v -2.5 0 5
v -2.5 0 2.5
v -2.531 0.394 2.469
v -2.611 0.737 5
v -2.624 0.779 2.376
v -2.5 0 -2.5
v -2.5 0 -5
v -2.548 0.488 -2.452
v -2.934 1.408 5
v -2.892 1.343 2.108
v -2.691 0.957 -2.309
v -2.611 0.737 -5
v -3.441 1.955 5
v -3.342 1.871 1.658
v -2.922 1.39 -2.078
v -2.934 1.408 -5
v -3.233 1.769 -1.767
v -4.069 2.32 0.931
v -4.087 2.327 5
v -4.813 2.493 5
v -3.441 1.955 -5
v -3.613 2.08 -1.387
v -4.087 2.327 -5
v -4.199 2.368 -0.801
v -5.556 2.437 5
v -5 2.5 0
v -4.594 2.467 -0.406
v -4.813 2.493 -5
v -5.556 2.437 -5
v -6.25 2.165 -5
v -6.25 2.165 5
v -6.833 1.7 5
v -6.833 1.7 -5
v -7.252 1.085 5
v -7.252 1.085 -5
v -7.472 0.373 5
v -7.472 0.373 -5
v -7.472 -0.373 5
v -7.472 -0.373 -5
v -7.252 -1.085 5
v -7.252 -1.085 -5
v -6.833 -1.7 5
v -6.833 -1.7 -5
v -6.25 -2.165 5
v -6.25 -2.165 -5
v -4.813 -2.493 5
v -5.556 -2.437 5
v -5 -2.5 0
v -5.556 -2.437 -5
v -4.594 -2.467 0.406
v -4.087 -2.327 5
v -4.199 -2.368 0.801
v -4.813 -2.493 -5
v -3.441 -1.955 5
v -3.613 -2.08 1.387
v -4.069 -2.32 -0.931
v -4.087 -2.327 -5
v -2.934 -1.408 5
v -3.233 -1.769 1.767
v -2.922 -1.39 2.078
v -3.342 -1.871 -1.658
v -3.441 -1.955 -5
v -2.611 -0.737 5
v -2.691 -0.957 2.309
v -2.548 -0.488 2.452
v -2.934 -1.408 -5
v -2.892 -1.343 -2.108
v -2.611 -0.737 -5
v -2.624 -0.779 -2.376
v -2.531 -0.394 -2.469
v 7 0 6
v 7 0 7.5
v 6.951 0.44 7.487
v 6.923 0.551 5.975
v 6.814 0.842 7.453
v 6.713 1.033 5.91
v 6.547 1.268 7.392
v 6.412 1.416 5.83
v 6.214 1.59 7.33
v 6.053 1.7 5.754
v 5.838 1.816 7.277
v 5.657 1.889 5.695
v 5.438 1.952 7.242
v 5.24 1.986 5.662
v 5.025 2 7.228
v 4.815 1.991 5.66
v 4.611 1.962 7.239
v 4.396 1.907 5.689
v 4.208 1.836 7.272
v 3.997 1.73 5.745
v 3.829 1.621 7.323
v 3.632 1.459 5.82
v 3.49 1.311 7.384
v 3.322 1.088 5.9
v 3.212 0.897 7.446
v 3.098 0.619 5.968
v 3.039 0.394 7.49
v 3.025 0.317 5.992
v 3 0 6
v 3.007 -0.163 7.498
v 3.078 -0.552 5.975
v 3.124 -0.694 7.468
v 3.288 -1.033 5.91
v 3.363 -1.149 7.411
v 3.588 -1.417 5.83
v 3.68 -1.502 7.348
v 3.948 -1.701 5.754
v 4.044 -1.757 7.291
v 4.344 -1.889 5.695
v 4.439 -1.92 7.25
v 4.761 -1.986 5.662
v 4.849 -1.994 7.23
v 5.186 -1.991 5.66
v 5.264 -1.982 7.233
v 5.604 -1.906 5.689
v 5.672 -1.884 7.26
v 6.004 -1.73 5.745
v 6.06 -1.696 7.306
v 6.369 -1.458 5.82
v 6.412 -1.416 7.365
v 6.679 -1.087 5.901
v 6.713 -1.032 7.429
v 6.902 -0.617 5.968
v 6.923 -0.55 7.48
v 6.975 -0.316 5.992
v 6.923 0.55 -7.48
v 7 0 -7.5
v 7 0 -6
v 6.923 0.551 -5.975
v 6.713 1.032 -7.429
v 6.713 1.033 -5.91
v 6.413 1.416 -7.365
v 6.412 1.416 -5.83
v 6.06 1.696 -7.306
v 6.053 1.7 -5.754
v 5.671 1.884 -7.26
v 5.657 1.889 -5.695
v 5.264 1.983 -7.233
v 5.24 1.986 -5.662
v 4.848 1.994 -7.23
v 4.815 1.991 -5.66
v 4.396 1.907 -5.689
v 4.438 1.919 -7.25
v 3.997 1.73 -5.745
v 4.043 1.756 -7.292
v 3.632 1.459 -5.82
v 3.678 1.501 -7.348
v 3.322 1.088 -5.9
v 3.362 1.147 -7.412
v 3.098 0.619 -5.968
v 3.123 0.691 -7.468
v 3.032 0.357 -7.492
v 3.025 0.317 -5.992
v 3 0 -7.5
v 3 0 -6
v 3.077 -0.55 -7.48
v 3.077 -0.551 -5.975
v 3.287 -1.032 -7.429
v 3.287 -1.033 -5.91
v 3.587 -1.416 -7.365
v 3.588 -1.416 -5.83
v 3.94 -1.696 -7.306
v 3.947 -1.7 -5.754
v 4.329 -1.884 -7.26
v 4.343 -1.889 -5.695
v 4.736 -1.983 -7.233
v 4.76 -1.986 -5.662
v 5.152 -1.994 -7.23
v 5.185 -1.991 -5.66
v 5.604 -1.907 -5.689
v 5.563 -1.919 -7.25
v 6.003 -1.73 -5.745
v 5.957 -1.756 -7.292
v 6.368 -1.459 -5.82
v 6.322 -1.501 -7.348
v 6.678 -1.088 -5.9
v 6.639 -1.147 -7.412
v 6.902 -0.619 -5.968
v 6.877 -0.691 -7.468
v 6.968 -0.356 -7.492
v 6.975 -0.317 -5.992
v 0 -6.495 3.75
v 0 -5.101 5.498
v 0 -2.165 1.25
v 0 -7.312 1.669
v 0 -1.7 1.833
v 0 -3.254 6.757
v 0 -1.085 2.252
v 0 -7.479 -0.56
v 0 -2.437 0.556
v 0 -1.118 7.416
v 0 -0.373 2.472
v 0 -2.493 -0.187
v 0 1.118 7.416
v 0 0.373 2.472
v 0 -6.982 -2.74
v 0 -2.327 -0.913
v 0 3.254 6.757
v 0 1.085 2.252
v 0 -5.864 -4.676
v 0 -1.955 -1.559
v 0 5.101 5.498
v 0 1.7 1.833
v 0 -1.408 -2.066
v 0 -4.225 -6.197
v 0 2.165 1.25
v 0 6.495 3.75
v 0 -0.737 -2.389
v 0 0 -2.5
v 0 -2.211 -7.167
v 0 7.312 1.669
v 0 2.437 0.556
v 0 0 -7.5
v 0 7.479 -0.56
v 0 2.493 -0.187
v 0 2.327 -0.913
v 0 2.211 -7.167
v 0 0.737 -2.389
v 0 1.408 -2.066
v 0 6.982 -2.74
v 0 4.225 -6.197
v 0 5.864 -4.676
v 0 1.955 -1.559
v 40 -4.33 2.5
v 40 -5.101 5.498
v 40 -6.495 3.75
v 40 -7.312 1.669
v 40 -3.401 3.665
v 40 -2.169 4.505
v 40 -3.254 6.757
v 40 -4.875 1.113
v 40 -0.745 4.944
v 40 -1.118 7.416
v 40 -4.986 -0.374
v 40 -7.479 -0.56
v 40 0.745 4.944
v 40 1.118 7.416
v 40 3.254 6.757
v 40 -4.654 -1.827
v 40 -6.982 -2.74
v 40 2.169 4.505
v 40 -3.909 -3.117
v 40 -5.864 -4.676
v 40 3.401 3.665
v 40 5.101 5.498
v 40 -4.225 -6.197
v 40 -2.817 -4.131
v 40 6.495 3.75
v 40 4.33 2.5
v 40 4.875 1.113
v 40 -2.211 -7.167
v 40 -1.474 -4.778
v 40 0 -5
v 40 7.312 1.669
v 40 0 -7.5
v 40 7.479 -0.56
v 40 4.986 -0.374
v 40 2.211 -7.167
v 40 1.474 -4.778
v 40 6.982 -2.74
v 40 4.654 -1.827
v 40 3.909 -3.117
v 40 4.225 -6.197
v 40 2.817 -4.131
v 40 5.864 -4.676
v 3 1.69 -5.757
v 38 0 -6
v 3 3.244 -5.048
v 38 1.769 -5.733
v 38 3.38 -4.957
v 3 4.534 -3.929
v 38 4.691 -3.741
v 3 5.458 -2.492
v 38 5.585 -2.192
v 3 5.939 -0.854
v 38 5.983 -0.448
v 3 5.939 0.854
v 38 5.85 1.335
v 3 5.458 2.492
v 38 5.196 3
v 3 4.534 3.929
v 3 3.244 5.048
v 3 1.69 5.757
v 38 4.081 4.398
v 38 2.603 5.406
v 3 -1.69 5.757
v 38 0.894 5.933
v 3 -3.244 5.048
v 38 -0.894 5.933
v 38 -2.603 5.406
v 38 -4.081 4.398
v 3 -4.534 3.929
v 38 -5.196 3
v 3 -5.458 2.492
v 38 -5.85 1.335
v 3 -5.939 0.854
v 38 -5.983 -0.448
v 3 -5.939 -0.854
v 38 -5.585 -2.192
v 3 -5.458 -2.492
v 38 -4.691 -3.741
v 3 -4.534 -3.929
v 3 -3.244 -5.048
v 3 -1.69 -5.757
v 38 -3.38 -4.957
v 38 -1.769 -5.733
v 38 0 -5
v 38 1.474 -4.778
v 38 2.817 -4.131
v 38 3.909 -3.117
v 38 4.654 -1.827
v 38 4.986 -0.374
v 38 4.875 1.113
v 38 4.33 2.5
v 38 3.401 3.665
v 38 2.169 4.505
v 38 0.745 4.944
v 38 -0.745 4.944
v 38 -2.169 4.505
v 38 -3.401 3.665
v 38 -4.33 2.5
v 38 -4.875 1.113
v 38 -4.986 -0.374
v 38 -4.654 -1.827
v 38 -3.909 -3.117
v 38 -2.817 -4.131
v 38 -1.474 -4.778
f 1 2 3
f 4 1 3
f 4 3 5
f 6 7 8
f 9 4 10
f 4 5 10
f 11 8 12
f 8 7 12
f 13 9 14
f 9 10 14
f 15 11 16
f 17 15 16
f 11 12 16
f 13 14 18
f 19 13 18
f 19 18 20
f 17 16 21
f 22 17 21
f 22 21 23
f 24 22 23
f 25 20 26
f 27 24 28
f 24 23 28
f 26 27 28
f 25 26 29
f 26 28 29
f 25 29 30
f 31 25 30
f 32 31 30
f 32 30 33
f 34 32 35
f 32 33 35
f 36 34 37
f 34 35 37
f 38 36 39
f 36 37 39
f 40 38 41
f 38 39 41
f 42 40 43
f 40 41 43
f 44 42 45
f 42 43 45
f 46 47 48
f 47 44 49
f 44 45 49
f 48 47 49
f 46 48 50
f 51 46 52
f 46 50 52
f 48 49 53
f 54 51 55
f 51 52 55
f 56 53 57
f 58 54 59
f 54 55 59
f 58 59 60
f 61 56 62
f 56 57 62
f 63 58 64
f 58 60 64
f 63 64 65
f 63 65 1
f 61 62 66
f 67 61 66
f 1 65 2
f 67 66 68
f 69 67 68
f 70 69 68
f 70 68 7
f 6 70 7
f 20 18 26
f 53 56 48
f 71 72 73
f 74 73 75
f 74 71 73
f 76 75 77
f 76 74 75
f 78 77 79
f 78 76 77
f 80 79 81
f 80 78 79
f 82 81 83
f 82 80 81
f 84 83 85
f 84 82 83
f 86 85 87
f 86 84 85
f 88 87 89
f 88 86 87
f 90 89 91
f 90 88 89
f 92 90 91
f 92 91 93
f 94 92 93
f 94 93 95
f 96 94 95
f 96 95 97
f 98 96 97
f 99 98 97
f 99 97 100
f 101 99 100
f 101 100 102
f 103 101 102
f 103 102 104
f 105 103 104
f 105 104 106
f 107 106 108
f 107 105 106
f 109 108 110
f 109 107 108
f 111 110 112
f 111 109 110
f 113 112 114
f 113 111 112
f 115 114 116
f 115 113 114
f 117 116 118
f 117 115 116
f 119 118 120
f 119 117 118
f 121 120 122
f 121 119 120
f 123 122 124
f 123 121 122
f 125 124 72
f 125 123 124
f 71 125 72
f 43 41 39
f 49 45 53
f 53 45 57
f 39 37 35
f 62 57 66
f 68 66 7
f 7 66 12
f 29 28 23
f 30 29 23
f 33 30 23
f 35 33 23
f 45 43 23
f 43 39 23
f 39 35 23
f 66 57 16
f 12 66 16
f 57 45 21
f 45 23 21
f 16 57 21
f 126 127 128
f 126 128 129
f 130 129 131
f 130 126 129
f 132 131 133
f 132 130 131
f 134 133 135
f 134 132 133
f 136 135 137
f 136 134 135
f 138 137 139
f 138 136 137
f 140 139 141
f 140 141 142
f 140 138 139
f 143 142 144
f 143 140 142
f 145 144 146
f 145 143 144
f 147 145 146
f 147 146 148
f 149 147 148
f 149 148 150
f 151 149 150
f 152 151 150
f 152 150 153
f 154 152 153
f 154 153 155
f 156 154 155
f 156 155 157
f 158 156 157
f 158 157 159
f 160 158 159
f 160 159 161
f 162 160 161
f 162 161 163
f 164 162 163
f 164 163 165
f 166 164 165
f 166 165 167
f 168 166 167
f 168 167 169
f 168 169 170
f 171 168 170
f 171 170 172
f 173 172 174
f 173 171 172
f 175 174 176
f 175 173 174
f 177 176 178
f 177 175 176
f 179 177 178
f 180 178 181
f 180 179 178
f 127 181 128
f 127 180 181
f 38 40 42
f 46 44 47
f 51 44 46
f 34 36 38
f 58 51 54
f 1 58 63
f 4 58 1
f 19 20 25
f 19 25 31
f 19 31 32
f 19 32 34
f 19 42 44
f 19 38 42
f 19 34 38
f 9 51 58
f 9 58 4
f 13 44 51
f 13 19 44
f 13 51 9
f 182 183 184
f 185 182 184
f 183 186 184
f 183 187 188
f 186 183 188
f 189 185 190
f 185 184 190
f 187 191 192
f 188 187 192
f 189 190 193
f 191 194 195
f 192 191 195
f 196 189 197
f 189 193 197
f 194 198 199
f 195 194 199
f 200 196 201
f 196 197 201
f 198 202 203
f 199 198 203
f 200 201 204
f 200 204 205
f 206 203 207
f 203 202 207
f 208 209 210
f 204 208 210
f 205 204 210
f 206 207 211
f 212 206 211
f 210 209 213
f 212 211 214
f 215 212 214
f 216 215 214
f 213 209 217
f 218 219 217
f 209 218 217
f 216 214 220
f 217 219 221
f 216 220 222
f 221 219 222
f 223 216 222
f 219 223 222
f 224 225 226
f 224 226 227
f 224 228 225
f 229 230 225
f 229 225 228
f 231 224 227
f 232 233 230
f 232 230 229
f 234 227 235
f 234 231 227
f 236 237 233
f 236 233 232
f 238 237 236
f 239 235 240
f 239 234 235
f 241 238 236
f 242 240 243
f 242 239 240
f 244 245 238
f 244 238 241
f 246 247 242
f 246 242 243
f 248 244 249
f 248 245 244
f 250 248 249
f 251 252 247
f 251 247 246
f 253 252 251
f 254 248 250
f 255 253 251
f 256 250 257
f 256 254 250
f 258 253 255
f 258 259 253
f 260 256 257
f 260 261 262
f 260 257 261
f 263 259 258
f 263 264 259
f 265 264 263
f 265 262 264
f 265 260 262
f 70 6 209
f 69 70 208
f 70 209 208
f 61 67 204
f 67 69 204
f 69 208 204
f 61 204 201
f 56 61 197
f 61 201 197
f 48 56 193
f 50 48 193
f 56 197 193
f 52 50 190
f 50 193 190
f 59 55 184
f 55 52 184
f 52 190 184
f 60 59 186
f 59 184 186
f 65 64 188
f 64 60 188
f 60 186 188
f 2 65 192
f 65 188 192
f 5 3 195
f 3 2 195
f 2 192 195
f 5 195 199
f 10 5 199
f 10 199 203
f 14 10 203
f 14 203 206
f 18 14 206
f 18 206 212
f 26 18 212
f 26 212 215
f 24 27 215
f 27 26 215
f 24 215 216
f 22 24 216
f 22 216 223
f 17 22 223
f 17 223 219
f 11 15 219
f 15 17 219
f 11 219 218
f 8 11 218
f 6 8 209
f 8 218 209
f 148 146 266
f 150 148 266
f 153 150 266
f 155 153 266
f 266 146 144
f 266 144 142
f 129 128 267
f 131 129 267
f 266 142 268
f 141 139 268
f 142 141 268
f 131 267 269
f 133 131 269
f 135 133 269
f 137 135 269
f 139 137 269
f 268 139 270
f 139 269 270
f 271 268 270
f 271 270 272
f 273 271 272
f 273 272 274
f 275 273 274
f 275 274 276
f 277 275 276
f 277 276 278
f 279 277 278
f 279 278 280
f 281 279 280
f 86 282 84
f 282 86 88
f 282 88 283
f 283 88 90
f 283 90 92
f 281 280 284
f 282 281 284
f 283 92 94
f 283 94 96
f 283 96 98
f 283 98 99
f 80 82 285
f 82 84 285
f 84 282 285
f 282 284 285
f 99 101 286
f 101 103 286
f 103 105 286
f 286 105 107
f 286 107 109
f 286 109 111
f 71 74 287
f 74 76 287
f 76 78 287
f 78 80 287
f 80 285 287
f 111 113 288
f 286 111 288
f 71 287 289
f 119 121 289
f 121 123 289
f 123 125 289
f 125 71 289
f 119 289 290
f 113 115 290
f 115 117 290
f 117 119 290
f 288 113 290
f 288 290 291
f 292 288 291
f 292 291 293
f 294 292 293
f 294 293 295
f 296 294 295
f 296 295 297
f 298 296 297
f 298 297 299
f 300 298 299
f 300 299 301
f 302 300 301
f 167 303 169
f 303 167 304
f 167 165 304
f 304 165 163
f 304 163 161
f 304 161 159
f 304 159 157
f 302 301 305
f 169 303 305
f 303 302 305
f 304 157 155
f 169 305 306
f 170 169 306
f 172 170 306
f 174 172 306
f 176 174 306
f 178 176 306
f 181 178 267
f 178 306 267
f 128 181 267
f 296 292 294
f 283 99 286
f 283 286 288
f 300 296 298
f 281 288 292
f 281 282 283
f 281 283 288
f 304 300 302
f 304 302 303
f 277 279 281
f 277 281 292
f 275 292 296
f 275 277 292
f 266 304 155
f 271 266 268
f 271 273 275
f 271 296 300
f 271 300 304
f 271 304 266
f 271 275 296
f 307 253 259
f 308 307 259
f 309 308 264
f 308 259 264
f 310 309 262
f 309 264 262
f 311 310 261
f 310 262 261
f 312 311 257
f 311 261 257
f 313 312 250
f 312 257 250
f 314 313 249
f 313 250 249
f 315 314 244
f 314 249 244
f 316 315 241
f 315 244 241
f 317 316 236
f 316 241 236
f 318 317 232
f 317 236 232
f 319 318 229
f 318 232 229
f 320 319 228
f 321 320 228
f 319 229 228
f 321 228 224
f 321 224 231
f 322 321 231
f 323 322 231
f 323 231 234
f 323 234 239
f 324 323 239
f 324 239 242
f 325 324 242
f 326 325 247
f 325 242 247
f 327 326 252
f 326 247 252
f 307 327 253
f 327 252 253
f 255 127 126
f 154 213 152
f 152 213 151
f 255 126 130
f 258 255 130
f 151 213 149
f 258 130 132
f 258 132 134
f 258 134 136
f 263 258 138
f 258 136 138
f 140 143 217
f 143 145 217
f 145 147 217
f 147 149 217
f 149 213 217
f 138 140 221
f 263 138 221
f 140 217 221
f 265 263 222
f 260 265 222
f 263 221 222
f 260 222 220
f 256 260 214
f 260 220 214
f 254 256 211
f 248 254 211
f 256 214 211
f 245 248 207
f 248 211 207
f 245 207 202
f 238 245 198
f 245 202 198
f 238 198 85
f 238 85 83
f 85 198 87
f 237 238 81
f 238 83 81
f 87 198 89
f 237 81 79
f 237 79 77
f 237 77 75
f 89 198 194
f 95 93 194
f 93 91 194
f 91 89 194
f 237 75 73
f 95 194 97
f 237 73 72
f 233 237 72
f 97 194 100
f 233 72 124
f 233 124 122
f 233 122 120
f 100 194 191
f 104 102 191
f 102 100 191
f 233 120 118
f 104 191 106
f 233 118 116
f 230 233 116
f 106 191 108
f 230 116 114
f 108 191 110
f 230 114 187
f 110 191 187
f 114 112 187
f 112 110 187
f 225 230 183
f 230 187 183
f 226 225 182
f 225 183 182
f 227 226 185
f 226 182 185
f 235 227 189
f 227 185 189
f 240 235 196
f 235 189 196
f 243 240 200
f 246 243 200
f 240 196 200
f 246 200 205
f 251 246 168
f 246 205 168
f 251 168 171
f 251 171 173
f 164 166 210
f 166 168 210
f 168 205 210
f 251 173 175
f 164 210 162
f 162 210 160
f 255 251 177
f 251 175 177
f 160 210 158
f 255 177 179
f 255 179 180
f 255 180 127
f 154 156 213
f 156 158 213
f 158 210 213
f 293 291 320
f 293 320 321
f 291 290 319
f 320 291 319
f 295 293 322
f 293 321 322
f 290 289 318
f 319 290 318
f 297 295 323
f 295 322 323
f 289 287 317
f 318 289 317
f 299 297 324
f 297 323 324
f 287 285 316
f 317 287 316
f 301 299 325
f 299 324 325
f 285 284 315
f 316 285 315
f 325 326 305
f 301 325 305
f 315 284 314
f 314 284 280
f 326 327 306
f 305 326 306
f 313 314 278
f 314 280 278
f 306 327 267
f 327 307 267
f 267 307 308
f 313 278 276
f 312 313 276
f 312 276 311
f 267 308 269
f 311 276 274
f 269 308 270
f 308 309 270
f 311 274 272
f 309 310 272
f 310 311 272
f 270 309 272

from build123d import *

# Parameters (mm, degrees)
SKETCH1_R                = 7.5
BOSS_EXTRUDE1_DEPTH      = 40
SKETCH2_R                = 5
CUT_EXTRUDE1_DEPTH       = 2
SKETCH3_R                = 6
CUT_EXTRUDE2_DEPTH       = 35
SKETCH4_R                = 2.5
BOSS_EXTRUDE4_DEPTH      = 5
BOSS_EXTRUDE5_DEPTH      = 5
BOSS_EXTRUDE5_DEPTH_BACK = 5
SKETCH6_R                = 2.5
F_3DSKETCH3_R            = 2
CUT_EXTRUDE3_DEPTH       = 39.810436741


with BuildPart() as part:
    # Sketch1 → Boss-Extrude1 (new body)
    with BuildSketch(Plane(origin=(0, 0, 0), x_dir=(0, 0, -1), z_dir=(1, 0, 0))):
        Circle(SKETCH1_R)
    extrude(amount=BOSS_EXTRUDE1_DEPTH)

    # Sketch2 → Cut-Extrude1 (cut)
    with BuildSketch(Plane(origin=(40, 0, 0), x_dir=(0, 0, -1), z_dir=(1, 0, 0))):
        Circle(SKETCH2_R)
    extrude(amount=-CUT_EXTRUDE1_DEPTH, mode=Mode.SUBTRACT)

    # Sketch3 → Cut-Extrude2 (cut)
    with BuildSketch(Plane(origin=(38, 0, 0), x_dir=(0, 0, -1), z_dir=(1, 0, 0))):
        Circle(SKETCH3_R)
    extrude(amount=-CUT_EXTRUDE2_DEPTH, mode=Mode.SUBTRACT)

    # Sketch4 → Boss-Extrude4 (add)
    with BuildSketch(Plane.ZY):
        Circle(SKETCH4_R)
    extrude(amount=BOSS_EXTRUDE4_DEPTH)

    # Sketch6 → Boss-Extrude5 (add, two sides: drawn at the far end of the back side and taken through both)
    with BuildSketch(Plane.XY.offset(-BOSS_EXTRUDE5_DEPTH_BACK)):
        with Locations((-5, 0)):
            Circle(SKETCH6_R)
    extrude(amount=BOSS_EXTRUDE5_DEPTH + BOSS_EXTRUDE5_DEPTH_BACK)

    # 3DSketch3 → Cut-Extrude3 (cut, through all)
    with BuildSketch(Plane(origin=(5, 0, -7.5), x_dir=(0, 1, 0), z_dir=(0, 0, -1))):
        Circle(F_3DSKETCH3_R)
    extrude(amount=-CUT_EXTRUDE3_DEPTH, mode=Mode.SUBTRACT)


solid = part.part
